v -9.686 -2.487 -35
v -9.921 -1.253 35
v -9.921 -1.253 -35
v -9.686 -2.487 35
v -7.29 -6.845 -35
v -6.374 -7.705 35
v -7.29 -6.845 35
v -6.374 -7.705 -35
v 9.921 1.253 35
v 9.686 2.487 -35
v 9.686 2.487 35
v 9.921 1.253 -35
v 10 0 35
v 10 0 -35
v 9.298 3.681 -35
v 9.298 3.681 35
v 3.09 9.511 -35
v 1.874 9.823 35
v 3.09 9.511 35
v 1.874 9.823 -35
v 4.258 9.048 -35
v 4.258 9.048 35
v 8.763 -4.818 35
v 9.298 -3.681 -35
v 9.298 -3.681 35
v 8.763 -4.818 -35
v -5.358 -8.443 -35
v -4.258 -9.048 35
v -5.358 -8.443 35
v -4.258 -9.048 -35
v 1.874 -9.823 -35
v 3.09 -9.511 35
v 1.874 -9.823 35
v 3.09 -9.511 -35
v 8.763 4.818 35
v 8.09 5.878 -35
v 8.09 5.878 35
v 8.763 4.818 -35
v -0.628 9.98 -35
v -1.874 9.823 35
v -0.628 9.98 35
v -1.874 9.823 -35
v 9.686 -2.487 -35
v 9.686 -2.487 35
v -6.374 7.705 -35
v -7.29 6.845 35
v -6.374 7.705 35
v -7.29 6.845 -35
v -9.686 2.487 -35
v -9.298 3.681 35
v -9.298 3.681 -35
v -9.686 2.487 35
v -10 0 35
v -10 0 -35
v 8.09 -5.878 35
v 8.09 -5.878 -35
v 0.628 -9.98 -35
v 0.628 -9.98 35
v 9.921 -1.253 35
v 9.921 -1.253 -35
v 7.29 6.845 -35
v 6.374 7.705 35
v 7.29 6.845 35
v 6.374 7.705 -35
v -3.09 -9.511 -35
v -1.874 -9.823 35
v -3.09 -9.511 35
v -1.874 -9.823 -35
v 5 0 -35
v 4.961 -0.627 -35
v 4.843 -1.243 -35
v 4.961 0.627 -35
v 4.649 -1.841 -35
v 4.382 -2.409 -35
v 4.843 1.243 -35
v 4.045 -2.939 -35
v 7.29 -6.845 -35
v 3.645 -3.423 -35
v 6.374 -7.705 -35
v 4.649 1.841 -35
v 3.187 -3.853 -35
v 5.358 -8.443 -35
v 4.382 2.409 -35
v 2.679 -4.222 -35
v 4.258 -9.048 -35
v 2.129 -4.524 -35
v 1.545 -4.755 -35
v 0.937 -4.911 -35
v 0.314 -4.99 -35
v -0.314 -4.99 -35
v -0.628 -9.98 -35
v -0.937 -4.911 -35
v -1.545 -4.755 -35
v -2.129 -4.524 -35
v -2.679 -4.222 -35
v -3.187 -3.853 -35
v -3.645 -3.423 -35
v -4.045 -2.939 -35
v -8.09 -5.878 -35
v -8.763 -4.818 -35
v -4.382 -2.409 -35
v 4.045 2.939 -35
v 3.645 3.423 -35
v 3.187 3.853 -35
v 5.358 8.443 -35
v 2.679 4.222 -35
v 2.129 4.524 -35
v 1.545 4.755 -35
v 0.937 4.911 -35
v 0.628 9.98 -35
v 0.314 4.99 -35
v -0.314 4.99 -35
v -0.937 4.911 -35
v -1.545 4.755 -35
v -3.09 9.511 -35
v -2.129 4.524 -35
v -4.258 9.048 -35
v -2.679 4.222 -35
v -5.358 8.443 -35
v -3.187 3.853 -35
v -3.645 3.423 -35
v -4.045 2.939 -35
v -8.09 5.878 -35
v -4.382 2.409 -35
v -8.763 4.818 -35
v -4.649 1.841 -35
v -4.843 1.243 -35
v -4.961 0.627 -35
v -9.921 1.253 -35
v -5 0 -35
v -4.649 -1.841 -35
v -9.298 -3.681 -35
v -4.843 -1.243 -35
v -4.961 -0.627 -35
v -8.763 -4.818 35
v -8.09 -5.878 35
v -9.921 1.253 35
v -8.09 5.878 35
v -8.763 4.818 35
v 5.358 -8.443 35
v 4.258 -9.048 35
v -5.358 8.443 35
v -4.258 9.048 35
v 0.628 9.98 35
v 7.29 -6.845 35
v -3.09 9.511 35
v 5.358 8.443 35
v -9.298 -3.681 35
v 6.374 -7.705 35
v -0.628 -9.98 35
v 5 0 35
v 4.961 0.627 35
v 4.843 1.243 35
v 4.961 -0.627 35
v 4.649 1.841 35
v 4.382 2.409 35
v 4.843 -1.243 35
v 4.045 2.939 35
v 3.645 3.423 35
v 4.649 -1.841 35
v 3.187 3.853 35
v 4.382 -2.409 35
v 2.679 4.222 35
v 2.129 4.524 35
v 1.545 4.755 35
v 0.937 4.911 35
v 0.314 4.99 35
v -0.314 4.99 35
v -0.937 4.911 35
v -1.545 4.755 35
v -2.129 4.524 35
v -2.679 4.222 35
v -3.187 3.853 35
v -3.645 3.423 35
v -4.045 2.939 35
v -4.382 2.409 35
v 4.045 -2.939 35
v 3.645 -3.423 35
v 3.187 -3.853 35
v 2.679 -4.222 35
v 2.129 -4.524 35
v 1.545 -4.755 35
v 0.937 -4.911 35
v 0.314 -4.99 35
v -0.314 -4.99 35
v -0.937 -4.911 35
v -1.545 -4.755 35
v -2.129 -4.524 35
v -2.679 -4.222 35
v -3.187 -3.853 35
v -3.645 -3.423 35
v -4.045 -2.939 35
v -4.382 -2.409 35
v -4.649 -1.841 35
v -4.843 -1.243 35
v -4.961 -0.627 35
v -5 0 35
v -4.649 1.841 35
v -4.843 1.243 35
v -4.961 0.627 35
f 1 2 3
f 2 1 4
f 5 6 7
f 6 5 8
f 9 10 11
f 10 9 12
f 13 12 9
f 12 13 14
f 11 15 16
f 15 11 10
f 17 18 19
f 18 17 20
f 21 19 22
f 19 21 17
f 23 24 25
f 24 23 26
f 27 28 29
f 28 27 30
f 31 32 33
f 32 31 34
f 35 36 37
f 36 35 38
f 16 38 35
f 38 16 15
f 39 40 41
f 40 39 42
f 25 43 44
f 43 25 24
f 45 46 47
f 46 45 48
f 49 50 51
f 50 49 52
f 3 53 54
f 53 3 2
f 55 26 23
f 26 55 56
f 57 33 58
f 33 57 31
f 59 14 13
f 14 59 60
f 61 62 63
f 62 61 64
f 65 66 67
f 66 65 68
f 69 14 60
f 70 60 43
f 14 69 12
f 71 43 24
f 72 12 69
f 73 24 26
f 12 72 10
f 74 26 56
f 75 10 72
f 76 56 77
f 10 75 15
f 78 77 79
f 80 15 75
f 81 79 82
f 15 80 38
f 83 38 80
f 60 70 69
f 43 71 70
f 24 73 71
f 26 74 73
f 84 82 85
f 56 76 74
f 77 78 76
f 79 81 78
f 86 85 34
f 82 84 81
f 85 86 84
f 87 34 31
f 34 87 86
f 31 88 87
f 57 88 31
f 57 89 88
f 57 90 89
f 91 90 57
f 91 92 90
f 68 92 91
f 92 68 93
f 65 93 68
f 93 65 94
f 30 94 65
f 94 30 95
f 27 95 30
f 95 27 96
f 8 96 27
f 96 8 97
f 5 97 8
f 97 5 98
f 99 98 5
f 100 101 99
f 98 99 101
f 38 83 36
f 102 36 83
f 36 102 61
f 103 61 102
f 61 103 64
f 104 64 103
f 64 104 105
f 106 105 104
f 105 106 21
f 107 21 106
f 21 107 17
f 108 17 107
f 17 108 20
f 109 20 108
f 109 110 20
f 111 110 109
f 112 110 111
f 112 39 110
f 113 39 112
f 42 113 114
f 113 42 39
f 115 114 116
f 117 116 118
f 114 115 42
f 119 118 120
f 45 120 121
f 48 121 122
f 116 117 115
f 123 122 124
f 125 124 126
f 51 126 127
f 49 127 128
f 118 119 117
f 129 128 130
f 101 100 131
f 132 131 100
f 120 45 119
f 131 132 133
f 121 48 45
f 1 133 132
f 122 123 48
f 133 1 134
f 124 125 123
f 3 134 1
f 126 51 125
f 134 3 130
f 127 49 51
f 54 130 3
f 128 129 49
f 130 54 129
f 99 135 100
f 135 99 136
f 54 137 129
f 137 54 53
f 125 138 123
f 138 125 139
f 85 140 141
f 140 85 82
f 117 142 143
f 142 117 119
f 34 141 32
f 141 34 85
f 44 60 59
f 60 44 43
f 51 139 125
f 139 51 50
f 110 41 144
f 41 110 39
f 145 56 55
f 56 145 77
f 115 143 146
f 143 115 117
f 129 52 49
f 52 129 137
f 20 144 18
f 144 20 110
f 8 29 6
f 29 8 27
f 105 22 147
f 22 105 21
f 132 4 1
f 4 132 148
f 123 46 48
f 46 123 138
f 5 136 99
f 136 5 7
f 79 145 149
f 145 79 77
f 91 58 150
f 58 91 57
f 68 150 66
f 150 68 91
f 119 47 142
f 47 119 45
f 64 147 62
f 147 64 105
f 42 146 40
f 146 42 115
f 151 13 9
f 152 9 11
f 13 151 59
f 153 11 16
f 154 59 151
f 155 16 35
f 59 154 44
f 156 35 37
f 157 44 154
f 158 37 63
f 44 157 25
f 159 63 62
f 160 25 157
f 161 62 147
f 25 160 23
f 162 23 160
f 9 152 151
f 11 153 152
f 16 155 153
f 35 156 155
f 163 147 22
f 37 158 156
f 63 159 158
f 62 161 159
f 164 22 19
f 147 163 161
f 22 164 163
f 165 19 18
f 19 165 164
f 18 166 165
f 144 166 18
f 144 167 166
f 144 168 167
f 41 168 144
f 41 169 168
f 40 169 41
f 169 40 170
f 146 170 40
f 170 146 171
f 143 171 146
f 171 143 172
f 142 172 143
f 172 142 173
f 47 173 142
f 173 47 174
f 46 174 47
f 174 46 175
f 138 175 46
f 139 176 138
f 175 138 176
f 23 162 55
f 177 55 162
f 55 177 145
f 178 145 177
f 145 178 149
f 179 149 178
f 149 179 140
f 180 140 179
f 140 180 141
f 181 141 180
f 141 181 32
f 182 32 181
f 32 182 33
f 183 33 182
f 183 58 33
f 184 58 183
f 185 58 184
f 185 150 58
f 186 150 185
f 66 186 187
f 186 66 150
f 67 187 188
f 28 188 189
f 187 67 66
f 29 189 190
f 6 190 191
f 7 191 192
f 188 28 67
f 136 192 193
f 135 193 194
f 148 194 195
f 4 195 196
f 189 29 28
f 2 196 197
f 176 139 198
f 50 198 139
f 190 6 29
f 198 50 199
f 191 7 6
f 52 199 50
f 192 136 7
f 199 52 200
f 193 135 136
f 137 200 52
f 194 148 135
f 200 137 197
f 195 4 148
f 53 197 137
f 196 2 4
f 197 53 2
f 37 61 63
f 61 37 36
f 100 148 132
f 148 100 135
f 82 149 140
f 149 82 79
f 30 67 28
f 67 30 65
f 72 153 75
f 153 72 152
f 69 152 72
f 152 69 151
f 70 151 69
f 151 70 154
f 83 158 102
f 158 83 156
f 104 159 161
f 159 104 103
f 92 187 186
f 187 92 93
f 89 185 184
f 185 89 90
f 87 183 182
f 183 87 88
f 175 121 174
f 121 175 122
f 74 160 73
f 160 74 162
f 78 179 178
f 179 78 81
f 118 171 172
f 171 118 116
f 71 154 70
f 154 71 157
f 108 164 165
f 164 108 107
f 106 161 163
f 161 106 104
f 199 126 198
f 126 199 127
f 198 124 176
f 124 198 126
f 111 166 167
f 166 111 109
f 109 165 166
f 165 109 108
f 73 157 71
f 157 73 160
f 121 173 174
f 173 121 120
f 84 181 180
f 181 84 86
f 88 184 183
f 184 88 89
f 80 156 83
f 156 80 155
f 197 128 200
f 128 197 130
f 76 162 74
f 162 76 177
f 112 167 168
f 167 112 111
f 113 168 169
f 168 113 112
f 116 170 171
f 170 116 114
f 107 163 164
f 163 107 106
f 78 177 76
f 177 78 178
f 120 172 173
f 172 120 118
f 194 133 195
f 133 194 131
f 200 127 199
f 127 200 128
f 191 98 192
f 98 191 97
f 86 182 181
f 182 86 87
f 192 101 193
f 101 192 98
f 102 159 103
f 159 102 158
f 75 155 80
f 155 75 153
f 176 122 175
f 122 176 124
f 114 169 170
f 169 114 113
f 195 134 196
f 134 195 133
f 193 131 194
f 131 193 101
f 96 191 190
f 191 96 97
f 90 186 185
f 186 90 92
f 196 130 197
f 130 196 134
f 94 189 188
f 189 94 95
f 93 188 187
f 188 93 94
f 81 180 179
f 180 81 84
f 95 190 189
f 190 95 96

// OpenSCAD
$fn = 50;


difference() {
	union() {
		translate(v = [0, 0, -35.0000000000]) {
			cylinder(h = 70, r = 10.0000000000);
		}
	}
	union() {
		translate(v = [0, 0, -100.0000000000]) {
			cylinder(h = 200, r = 5.0000000000);
		}
	}
}
